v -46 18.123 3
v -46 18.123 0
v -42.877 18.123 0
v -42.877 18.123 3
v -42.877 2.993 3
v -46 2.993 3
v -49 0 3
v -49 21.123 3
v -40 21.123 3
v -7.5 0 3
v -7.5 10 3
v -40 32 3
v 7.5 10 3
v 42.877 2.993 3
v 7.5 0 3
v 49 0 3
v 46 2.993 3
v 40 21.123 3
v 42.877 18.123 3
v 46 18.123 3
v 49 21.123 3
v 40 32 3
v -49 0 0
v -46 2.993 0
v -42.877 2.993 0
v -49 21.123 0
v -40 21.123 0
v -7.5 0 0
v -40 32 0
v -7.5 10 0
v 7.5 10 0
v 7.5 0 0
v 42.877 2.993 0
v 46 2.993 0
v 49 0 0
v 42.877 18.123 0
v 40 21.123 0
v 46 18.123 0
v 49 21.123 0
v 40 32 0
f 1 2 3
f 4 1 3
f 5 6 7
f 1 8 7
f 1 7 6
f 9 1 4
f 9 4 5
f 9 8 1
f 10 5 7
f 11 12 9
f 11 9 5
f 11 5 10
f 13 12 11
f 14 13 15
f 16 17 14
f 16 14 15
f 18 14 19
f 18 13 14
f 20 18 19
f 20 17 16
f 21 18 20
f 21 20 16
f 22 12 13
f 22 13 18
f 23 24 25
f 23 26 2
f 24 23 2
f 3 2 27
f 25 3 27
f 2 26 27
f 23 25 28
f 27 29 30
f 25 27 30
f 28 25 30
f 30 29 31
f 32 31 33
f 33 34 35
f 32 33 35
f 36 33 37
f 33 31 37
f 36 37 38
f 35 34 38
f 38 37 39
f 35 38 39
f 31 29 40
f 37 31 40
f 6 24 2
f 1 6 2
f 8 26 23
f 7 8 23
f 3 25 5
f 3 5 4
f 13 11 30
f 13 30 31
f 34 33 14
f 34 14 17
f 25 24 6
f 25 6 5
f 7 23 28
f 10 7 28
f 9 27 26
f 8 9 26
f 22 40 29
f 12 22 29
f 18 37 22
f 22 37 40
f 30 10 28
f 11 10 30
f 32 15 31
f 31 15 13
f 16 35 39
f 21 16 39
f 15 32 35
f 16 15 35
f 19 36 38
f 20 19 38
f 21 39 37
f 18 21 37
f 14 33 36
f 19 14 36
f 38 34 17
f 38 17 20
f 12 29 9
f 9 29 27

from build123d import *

# Parameters (mm, degrees)
CROQUIS1_W              = 3.123
CROQUIS1_H              = 15.13
SALIENTE_EXTRUIR1_DEPTH = 3
CROQUIS2_W              = 15
CROQUIS2_H              = 10
CORTAR_EXTRUIR1_DEPTH   = 4


with BuildPart() as part:
    # Croquis1 → Saliente-Extruir1 (new body)
    with BuildSketch(Plane.XY):
        Polygon((-49, 0), (49, 0), (49, 21.123), (40, 21.123), (40, 32), (-40, 32), (-40, 21.123), (-49, 21.123), align=None)
        with Locations((-44.4385, 10.558)):
            Rectangle(CROQUIS1_W, CROQUIS1_H, mode=Mode.SUBTRACT)
        with Locations((44.4385, 10.558)):
            Rectangle(CROQUIS1_W, CROQUIS1_H, mode=Mode.SUBTRACT)
    extrude(amount=SALIENTE_EXTRUIR1_DEPTH)

    # Croquis2 → Cortar-Extruir1 (cut, through all)
    with BuildSketch(Plane.XY.offset(3)):
        with Locations((0, 5)):
            Rectangle(CROQUIS2_W, CROQUIS2_H)
    extrude(amount=-CORTAR_EXTRUIR1_DEPTH, mode=Mode.SUBTRACT)


solid = part.part
